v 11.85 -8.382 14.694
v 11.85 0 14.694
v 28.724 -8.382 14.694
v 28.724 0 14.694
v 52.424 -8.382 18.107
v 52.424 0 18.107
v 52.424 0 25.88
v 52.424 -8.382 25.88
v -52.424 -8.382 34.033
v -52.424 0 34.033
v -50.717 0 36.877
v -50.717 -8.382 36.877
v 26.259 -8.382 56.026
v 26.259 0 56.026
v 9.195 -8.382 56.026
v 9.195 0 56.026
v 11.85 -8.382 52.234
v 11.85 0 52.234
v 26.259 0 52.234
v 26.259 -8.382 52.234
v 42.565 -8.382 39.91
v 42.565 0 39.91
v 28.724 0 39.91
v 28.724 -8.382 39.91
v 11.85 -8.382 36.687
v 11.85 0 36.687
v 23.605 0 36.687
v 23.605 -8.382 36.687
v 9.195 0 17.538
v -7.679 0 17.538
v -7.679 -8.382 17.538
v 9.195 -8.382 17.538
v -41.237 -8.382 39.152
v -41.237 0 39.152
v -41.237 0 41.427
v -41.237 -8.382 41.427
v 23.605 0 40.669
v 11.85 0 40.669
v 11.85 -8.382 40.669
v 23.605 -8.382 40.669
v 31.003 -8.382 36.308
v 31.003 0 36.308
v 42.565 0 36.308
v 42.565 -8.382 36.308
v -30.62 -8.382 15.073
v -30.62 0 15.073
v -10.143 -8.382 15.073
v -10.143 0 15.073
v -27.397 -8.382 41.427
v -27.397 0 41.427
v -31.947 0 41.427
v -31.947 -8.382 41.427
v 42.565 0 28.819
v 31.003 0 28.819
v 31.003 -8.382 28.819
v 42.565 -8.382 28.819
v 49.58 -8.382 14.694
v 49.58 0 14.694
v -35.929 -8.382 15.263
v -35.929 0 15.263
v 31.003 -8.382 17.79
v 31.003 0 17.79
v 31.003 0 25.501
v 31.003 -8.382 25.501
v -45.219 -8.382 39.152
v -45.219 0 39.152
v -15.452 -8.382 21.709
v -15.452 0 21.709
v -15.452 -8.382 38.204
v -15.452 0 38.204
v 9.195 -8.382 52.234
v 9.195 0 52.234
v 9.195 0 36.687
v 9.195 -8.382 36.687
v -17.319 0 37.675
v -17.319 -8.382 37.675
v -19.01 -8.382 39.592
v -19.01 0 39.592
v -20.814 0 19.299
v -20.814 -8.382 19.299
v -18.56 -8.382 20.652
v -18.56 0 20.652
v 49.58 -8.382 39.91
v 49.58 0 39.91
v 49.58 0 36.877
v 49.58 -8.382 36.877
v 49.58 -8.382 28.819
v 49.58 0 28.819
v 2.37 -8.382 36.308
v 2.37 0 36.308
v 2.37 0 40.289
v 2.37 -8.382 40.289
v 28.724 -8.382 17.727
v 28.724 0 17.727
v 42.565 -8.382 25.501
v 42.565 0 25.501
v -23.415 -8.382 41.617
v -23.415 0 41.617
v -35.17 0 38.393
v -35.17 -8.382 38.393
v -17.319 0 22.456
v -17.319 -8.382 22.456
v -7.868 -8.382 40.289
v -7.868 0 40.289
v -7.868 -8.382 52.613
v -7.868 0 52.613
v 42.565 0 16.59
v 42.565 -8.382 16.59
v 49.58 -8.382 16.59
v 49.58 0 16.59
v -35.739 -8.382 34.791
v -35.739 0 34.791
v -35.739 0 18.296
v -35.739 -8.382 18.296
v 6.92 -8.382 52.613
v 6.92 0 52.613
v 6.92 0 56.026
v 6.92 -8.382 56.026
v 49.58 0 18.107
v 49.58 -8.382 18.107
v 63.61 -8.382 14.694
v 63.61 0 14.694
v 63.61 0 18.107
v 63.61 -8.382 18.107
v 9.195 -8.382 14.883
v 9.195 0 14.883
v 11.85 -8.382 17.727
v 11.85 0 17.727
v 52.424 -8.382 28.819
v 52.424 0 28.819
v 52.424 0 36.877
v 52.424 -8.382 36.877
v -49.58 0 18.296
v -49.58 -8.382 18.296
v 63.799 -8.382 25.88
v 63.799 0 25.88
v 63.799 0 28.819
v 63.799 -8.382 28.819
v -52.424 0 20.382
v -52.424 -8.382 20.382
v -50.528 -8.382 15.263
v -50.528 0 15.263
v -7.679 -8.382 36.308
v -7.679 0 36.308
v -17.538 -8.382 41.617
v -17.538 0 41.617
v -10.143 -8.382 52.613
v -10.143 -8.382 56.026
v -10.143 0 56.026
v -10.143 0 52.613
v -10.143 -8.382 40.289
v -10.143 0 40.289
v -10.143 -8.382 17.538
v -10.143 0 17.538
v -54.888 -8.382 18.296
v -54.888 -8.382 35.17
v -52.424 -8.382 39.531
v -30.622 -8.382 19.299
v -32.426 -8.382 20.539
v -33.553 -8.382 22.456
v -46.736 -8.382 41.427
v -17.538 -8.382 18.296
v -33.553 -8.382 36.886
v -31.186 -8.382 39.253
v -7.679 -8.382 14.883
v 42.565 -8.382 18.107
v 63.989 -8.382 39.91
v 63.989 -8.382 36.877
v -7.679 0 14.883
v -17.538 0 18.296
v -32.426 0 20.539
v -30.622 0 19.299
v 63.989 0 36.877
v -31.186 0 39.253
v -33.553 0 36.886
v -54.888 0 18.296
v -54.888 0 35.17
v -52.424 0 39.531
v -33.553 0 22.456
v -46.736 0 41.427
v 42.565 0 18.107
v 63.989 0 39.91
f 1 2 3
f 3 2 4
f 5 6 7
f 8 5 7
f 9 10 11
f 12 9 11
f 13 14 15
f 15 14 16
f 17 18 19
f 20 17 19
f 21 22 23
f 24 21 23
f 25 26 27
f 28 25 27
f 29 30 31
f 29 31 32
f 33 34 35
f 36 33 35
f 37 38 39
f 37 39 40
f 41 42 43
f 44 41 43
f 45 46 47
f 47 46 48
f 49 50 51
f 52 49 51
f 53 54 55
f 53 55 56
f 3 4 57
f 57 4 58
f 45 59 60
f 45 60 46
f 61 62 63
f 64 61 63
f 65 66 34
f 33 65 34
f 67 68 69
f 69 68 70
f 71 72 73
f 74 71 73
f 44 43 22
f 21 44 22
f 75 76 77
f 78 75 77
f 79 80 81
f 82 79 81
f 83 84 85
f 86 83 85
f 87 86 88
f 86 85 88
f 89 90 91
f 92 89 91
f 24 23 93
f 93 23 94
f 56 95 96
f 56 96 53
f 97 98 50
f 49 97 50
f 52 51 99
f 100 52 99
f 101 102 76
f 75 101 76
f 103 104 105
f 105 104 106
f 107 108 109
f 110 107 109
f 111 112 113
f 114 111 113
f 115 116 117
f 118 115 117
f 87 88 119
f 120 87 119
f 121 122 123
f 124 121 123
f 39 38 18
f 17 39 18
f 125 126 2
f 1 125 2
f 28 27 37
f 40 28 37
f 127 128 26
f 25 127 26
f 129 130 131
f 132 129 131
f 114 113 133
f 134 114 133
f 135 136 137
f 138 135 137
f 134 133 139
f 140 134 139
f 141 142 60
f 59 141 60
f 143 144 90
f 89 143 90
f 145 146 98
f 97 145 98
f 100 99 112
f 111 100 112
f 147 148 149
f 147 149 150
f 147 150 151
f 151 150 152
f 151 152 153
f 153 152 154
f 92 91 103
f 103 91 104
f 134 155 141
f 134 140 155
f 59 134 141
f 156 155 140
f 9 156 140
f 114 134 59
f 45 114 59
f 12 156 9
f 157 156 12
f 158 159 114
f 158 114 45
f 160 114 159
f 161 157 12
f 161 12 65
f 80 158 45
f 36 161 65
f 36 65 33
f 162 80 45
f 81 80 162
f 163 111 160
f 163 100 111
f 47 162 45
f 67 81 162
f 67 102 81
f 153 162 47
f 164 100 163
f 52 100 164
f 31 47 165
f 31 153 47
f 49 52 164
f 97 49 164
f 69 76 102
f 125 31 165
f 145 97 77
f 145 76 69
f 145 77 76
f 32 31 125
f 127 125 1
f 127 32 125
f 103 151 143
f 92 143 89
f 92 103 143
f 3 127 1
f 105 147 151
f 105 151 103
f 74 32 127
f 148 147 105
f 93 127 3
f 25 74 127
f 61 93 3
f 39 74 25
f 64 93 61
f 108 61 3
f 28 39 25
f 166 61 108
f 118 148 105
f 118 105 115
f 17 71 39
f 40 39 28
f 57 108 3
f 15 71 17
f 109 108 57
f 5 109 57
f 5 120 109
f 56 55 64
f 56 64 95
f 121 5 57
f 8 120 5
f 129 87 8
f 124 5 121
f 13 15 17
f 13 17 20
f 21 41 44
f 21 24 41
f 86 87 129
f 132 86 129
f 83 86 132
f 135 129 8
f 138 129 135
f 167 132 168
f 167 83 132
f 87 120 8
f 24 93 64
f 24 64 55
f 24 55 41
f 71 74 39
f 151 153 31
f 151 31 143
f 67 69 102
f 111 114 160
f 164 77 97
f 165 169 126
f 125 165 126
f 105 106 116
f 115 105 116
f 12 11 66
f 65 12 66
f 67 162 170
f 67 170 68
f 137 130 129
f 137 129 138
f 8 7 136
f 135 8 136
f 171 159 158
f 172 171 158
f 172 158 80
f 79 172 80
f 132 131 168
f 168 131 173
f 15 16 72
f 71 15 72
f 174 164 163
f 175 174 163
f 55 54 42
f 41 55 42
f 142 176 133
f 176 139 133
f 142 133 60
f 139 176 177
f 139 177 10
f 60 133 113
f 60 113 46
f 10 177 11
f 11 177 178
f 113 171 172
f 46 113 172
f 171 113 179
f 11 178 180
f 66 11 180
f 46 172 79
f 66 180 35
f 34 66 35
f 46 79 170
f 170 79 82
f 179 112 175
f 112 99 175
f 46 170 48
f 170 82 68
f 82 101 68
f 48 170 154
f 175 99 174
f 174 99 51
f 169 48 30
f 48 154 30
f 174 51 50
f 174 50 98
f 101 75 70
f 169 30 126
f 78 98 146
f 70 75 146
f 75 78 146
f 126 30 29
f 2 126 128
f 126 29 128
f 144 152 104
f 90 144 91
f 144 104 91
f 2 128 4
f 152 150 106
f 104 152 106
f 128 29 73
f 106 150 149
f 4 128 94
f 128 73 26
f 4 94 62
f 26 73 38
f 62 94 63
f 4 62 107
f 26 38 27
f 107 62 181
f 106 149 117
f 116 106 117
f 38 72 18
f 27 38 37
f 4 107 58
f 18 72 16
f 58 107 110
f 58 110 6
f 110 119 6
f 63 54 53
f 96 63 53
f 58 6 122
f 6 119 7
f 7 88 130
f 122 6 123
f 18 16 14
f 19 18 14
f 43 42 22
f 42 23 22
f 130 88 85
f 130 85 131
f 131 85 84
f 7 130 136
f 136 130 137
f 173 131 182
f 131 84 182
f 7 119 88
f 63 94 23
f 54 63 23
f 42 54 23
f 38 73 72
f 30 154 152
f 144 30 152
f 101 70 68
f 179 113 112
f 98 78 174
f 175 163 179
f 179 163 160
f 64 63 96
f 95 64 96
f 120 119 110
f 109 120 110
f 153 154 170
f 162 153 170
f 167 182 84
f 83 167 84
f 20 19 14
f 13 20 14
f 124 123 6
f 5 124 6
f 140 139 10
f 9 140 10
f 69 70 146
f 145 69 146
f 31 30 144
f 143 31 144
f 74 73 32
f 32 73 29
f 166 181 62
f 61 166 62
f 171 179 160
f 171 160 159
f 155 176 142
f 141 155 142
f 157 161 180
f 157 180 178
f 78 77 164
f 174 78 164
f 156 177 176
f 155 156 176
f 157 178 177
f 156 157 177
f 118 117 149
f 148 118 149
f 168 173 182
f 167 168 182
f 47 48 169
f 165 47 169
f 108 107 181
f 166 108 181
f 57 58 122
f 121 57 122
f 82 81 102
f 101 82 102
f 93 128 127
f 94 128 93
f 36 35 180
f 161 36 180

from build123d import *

# Parameters (mm, degrees)
F0_W     = 16.8741471134
F0_H     = 2.6543606073
F0_W_2   = 2.2751651704
F0_H_2   = 12.3238116503
F0_W_3   = 16.8741438538
F0_H_3   = 3.0335541815
F0_W_4   = 2.6543606073
F0_H_4   = 3.9815418422
F0_H_5   = 11.5654245019
F0_W_5   = 11.7550231516
F0_W_6   = 7.0150978863
F0_H_6   = 1.8959715962
F0_W_7   = 2.2786548152
F0_H_7   = 3.3179512247
F0_H_8   = 7.4890879914
F0_W_8   = 11.5619385824
F0_W_9   = 2.8439611197
F0_H_9   = 7.7734831721
F0_H_10  = 2.9387557879
F0_H_11  = 8.0578802153
F0_W_10  = 11.3758221269
F1_DEPTH = 7.62
F2_DEPTH = 8.382
F4_DEPTH = 25.4


with BuildPart() as f1:
    # F0 (on Front) → F1 (new body)
    with BuildSketch(Plane.XZ):
        Polygon((-41.2373803556, 39.1518138349), (-41.2373803556, 41.4269790053), (-46.7357002199, 41.4269790053), (-52.4236150086, 39.5310074091), (-54.8883751035, 35.1702719927), (-54.8883751035, 26.8279965967), (-54.8883751035, 18.2961262763), (-50.5276434124, 15.2625711635), (-46.1669079959, 15.2625711635), (-41.9957712293, 15.2625711635), (-35.9286628664, 15.2625711635), (-30.6199416518, 15.0729743764), (-35.7390642166, 18.2961262763), (-41.2373803556, 18.2961262763), (-49.5796576142, 18.2961262763), (-52.4236150086, 20.3816946596), (-52.4236150086, 25.8800126612), (-52.4236150086, 34.0326912701), (-50.7172383368, 36.8766486645), (-45.2189221978, 39.1518138349), align=None)
        Polygon((-35.7390642166, 34.7910784185), (-35.7390642166, 18.2961262763), (-30.6199416518, 15.0729743764), (-20.9504868835, 15.0729743764), (-17.5377372652, 18.2961262763), (-15.4521688819, 21.7088758945), (-15.4521688819, 32.5159132481), (-15.4521688819, 38.2038280368), (-17.5377372652, 41.6165776551), (-23.415248841, 41.6165776551), (-27.3967888206, 41.4269790053), (-31.9471210241, 41.4269790053), (-35.1702719927, 38.3934266865), align=None)
        Polygon((-17.5377372652, 18.2961262763), (-20.9504868835, 15.0729743764), (-10.1434476674, 15.0729743764), (-10.1434476674, 17.5377372652), align=None)
        Polygon((-10.1434476674, 17.5377372652), (-10.1434476674, 15.0729743764), (-7.6786852442, 14.883376658), (-7.6786852442, 17.5377372652), (-7.6786852442, 36.3078564405), (-10.1434476674, 36.3078564405), align=None)
        with Locations((0.7583883125, 16.2105569616)):
            Rectangle(F0_W, F0_H)
        Polygon((-10.1434476674, 40.2893982828), (-10.1434476674, 36.3078564405), (-7.6786852442, 36.3078564405), (2.3699654266, 36.3078564405), (2.3699654266, 40.2893982828), (-7.8682824969, 40.2893982828), align=None)
        Polygon((9.1954618692, 17.5377372652), (9.1954618692, 14.883376658), (11.8498224765, 14.6937798709), (11.8498224765, 17.7273340523), (11.8498224765, 36.6870500147), (9.1954618692, 36.6870500147), align=None)
        with Locations((-9.0058650821, 46.4513041079)):
            Rectangle(F0_W_2, F0_H_2)
        with Locations((20.2868944034, 16.2105569616)):
            Rectangle(F0_W_3, F0_H_3)
        Polygon((-10.1434476674, 56.0259595513), (-10.1434476674, 52.613209933), (-7.8682824969, 52.613209933), (6.9202957675, 52.613209933), (6.9202957675, 56.0259595513), align=None)
        with Locations((10.5226421729, 38.6778209358)):
            Rectangle(F0_W_4, F0_H_4)
        Polygon((28.7239663303, 17.7273340523), (28.7239663303, 14.6937798709), (42.5645597279, 14.6937798709), (42.5645597279, 16.5897514671), (42.5645597279, 18.1065294892), (31.0026211455, 17.789763132), align=None)
        with Locations((10.5226421729, 46.4513041079)):
            Rectangle(F0_W_4, F0_H_5)
        with Locations((17.7273340523, 38.6778209358)):
            Rectangle(F0_W_5, F0_H_4)
        Polygon((28.7239663303, 25.5008172244), (28.7239663303, 17.7273340523), (31.0026211455, 17.789763132), (31.0026211455, 25.5008172244), align=None)
        with Locations((46.0721086711, 15.641765669)):
            Rectangle(F0_W_6, F0_H_6)
        Polygon((9.1954618692, 56.0259595513), (9.1954618692, 52.2340163589), (11.8498224765, 52.2340163589), (26.2592080981, 52.2340163589), (26.2592080981, 56.0259595513), align=None)
        with Locations((29.8632937379, 27.1597928368)):
            Rectangle(F0_W_7, F0_H_7)
        Polygon((49.5796576142, 16.5897514671), (49.5796576142, 14.6937798709), (63.6098459363, 14.6937798709), (63.6098459363, 18.1065294892), (52.4236187339, 18.1065294892), (49.5796576142, 18.1065294892), align=None)
        with Locations((29.8632937379, 32.5633124448)):
            Rectangle(F0_W_7, F0_H_8)
        with Locations((36.7835904367, 27.1597928368)):
            Rectangle(F0_W_8, F0_H_7)
        Polygon((28.7239663303, 39.9102028459), (28.7239663303, 36.3078564405), (31.0026211455, 36.3078564405), (42.5645597279, 36.3078564405), (42.5645597279, 39.9102028459), align=None)
        with Locations((51.0016381741, 21.9932710752)):
            Rectangle(F0_W_9, F0_H_9)
        with Locations((51.0016381741, 27.3493905552)):
            Rectangle(F0_W_9, F0_H_10)
        with Locations((51.0016381741, 32.8477085568)):
            Rectangle(F0_W_9, F0_H_11)
        with Locations((58.1115297973, 27.3493905552)):
            Rectangle(F0_W_10, F0_H_10)
        Polygon((49.5796576142, 39.9102047086), (49.5796576142, 36.8766486645), (52.4236187339, 36.8766486645), (63.9890432358, 36.8766486645), (63.9890432358, 39.9102047086), align=None)
    extrude(amount=F1_DEPTH)

    # F0 (on Front) → F2 (join)
    with BuildSketch(Plane.XZ):
        Polygon((-41.2373803556, 39.1518138349), (-41.2373803556, 41.4269790053), (-46.7357002199, 41.4269790053), (-52.4236150086, 39.5310074091), (-54.8883751035, 35.1702719927), (-54.8883751035, 26.8279965967), (-54.8883751035, 18.2961262763), (-50.5276434124, 15.2625711635), (-46.1669079959, 15.2625711635), (-41.9957712293, 15.2625711635), (-35.9286628664, 15.2625711635), (-30.6199416518, 15.0729743764), (-35.7390642166, 18.2961262763), (-41.2373803556, 18.2961262763), (-49.5796576142, 18.2961262763), (-52.4236150086, 20.3816946596), (-52.4236150086, 25.8800126612), (-52.4236150086, 34.0326912701), (-50.7172383368, 36.8766486645), (-45.2189221978, 39.1518138349), align=None)
        Polygon((-35.7390642166, 34.7910784185), (-35.7390642166, 18.2961262763), (-30.6199416518, 15.0729743764), (-20.9504868835, 15.0729743764), (-17.5377372652, 18.2961262763), (-15.4521688819, 21.7088758945), (-15.4521688819, 32.5159132481), (-15.4521688819, 38.2038280368), (-17.5377372652, 41.6165776551), (-23.415248841, 41.6165776551), (-27.3967888206, 41.4269790053), (-31.9471210241, 41.4269790053), (-35.1702719927, 38.3934266865), align=None)
        Polygon((-17.5377372652, 18.2961262763), (-20.9504868835, 15.0729743764), (-10.1434476674, 15.0729743764), (-10.1434476674, 17.5377372652), align=None)
        Polygon((-10.1434476674, 17.5377372652), (-10.1434476674, 15.0729743764), (-7.6786852442, 14.883376658), (-7.6786852442, 17.5377372652), (-7.6786852442, 36.3078564405), (-10.1434476674, 36.3078564405), align=None)
        with Locations((0.7583883125, 16.2105569616)):
            Rectangle(F0_W, F0_H)
        Polygon((-10.1434476674, 40.2893982828), (-10.1434476674, 36.3078564405), (-7.6786852442, 36.3078564405), (2.3699654266, 36.3078564405), (2.3699654266, 40.2893982828), (-7.8682824969, 40.2893982828), align=None)
        Polygon((9.1954618692, 17.5377372652), (9.1954618692, 14.883376658), (11.8498224765, 14.6937798709), (11.8498224765, 17.7273340523), (11.8498224765, 36.6870500147), (9.1954618692, 36.6870500147), align=None)
        with Locations((-9.0058650821, 46.4513041079)):
            Rectangle(F0_W_2, F0_H_2)
        with Locations((20.2868944034, 16.2105569616)):
            Rectangle(F0_W_3, F0_H_3)
        Polygon((-10.1434476674, 56.0259595513), (-10.1434476674, 52.613209933), (-7.8682824969, 52.613209933), (6.9202957675, 52.613209933), (6.9202957675, 56.0259595513), align=None)
        with Locations((10.5226421729, 38.6778209358)):
            Rectangle(F0_W_4, F0_H_4)
        Polygon((28.7239663303, 17.7273340523), (28.7239663303, 14.6937798709), (42.5645597279, 14.6937798709), (42.5645597279, 16.5897514671), (42.5645597279, 18.1065294892), (31.0026211455, 17.789763132), align=None)
        with Locations((10.5226421729, 46.4513041079)):
            Rectangle(F0_W_4, F0_H_5)
        with Locations((17.7273340523, 38.6778209358)):
            Rectangle(F0_W_5, F0_H_4)
        Polygon((28.7239663303, 25.5008172244), (28.7239663303, 17.7273340523), (31.0026211455, 17.789763132), (31.0026211455, 25.5008172244), align=None)
        with Locations((46.0721086711, 15.641765669)):
            Rectangle(F0_W_6, F0_H_6)
        Polygon((9.1954618692, 56.0259595513), (9.1954618692, 52.2340163589), (11.8498224765, 52.2340163589), (26.2592080981, 52.2340163589), (26.2592080981, 56.0259595513), align=None)
        with Locations((29.8632937379, 27.1597928368)):
            Rectangle(F0_W_7, F0_H_7)
        Polygon((49.5796576142, 16.5897514671), (49.5796576142, 14.6937798709), (63.6098459363, 14.6937798709), (63.6098459363, 18.1065294892), (52.4236187339, 18.1065294892), (49.5796576142, 18.1065294892), align=None)
        with Locations((29.8632937379, 32.5633124448)):
            Rectangle(F0_W_7, F0_H_8)
        with Locations((36.7835904367, 27.1597928368)):
            Rectangle(F0_W_8, F0_H_7)
        Polygon((28.7239663303, 39.9102028459), (28.7239663303, 36.3078564405), (31.0026211455, 36.3078564405), (42.5645597279, 36.3078564405), (42.5645597279, 39.9102028459), align=None)
        with Locations((51.0016381741, 21.9932710752)):
            Rectangle(F0_W_9, F0_H_9)
        with Locations((51.0016381741, 27.3493905552)):
            Rectangle(F0_W_9, F0_H_10)
        with Locations((51.0016381741, 32.8477085568)):
            Rectangle(F0_W_9, F0_H_11)
        with Locations((58.1115297973, 27.3493905552)):
            Rectangle(F0_W_10, F0_H_10)
        Polygon((49.5796576142, 39.9102047086), (49.5796576142, 36.8766486645), (52.4236187339, 36.8766486645), (63.9890432358, 36.8766486645), (63.9890432358, 39.9102047086), align=None)
    extrude(amount=F2_DEPTH)

    # F3 (on face) → F4 (cut)
    with BuildSketch(Plane.XZ.offset(8.382)):
        Polygon((-19.0104637295, 39.5915135741), (-31.1858598143, 39.2533093691), (-33.5532985628, 36.885868758), (-33.5532985628, 32.8274033964), (-33.5532985628, 22.4557705224), (-32.4259474874, 20.5392725766), (-30.6221842766, 19.2991867661), (-20.8142269403, 19.2991867661), (-18.5595247895, 20.6520091742), (-17.3194371164, 22.4557705224), (-17.3194371164, 32.8274033964), (-17.3194371164, 37.6750156283), align=None)
    extrude(amount=-F4_DEPTH, mode=Mode.SUBTRACT)


solid = f1.part
